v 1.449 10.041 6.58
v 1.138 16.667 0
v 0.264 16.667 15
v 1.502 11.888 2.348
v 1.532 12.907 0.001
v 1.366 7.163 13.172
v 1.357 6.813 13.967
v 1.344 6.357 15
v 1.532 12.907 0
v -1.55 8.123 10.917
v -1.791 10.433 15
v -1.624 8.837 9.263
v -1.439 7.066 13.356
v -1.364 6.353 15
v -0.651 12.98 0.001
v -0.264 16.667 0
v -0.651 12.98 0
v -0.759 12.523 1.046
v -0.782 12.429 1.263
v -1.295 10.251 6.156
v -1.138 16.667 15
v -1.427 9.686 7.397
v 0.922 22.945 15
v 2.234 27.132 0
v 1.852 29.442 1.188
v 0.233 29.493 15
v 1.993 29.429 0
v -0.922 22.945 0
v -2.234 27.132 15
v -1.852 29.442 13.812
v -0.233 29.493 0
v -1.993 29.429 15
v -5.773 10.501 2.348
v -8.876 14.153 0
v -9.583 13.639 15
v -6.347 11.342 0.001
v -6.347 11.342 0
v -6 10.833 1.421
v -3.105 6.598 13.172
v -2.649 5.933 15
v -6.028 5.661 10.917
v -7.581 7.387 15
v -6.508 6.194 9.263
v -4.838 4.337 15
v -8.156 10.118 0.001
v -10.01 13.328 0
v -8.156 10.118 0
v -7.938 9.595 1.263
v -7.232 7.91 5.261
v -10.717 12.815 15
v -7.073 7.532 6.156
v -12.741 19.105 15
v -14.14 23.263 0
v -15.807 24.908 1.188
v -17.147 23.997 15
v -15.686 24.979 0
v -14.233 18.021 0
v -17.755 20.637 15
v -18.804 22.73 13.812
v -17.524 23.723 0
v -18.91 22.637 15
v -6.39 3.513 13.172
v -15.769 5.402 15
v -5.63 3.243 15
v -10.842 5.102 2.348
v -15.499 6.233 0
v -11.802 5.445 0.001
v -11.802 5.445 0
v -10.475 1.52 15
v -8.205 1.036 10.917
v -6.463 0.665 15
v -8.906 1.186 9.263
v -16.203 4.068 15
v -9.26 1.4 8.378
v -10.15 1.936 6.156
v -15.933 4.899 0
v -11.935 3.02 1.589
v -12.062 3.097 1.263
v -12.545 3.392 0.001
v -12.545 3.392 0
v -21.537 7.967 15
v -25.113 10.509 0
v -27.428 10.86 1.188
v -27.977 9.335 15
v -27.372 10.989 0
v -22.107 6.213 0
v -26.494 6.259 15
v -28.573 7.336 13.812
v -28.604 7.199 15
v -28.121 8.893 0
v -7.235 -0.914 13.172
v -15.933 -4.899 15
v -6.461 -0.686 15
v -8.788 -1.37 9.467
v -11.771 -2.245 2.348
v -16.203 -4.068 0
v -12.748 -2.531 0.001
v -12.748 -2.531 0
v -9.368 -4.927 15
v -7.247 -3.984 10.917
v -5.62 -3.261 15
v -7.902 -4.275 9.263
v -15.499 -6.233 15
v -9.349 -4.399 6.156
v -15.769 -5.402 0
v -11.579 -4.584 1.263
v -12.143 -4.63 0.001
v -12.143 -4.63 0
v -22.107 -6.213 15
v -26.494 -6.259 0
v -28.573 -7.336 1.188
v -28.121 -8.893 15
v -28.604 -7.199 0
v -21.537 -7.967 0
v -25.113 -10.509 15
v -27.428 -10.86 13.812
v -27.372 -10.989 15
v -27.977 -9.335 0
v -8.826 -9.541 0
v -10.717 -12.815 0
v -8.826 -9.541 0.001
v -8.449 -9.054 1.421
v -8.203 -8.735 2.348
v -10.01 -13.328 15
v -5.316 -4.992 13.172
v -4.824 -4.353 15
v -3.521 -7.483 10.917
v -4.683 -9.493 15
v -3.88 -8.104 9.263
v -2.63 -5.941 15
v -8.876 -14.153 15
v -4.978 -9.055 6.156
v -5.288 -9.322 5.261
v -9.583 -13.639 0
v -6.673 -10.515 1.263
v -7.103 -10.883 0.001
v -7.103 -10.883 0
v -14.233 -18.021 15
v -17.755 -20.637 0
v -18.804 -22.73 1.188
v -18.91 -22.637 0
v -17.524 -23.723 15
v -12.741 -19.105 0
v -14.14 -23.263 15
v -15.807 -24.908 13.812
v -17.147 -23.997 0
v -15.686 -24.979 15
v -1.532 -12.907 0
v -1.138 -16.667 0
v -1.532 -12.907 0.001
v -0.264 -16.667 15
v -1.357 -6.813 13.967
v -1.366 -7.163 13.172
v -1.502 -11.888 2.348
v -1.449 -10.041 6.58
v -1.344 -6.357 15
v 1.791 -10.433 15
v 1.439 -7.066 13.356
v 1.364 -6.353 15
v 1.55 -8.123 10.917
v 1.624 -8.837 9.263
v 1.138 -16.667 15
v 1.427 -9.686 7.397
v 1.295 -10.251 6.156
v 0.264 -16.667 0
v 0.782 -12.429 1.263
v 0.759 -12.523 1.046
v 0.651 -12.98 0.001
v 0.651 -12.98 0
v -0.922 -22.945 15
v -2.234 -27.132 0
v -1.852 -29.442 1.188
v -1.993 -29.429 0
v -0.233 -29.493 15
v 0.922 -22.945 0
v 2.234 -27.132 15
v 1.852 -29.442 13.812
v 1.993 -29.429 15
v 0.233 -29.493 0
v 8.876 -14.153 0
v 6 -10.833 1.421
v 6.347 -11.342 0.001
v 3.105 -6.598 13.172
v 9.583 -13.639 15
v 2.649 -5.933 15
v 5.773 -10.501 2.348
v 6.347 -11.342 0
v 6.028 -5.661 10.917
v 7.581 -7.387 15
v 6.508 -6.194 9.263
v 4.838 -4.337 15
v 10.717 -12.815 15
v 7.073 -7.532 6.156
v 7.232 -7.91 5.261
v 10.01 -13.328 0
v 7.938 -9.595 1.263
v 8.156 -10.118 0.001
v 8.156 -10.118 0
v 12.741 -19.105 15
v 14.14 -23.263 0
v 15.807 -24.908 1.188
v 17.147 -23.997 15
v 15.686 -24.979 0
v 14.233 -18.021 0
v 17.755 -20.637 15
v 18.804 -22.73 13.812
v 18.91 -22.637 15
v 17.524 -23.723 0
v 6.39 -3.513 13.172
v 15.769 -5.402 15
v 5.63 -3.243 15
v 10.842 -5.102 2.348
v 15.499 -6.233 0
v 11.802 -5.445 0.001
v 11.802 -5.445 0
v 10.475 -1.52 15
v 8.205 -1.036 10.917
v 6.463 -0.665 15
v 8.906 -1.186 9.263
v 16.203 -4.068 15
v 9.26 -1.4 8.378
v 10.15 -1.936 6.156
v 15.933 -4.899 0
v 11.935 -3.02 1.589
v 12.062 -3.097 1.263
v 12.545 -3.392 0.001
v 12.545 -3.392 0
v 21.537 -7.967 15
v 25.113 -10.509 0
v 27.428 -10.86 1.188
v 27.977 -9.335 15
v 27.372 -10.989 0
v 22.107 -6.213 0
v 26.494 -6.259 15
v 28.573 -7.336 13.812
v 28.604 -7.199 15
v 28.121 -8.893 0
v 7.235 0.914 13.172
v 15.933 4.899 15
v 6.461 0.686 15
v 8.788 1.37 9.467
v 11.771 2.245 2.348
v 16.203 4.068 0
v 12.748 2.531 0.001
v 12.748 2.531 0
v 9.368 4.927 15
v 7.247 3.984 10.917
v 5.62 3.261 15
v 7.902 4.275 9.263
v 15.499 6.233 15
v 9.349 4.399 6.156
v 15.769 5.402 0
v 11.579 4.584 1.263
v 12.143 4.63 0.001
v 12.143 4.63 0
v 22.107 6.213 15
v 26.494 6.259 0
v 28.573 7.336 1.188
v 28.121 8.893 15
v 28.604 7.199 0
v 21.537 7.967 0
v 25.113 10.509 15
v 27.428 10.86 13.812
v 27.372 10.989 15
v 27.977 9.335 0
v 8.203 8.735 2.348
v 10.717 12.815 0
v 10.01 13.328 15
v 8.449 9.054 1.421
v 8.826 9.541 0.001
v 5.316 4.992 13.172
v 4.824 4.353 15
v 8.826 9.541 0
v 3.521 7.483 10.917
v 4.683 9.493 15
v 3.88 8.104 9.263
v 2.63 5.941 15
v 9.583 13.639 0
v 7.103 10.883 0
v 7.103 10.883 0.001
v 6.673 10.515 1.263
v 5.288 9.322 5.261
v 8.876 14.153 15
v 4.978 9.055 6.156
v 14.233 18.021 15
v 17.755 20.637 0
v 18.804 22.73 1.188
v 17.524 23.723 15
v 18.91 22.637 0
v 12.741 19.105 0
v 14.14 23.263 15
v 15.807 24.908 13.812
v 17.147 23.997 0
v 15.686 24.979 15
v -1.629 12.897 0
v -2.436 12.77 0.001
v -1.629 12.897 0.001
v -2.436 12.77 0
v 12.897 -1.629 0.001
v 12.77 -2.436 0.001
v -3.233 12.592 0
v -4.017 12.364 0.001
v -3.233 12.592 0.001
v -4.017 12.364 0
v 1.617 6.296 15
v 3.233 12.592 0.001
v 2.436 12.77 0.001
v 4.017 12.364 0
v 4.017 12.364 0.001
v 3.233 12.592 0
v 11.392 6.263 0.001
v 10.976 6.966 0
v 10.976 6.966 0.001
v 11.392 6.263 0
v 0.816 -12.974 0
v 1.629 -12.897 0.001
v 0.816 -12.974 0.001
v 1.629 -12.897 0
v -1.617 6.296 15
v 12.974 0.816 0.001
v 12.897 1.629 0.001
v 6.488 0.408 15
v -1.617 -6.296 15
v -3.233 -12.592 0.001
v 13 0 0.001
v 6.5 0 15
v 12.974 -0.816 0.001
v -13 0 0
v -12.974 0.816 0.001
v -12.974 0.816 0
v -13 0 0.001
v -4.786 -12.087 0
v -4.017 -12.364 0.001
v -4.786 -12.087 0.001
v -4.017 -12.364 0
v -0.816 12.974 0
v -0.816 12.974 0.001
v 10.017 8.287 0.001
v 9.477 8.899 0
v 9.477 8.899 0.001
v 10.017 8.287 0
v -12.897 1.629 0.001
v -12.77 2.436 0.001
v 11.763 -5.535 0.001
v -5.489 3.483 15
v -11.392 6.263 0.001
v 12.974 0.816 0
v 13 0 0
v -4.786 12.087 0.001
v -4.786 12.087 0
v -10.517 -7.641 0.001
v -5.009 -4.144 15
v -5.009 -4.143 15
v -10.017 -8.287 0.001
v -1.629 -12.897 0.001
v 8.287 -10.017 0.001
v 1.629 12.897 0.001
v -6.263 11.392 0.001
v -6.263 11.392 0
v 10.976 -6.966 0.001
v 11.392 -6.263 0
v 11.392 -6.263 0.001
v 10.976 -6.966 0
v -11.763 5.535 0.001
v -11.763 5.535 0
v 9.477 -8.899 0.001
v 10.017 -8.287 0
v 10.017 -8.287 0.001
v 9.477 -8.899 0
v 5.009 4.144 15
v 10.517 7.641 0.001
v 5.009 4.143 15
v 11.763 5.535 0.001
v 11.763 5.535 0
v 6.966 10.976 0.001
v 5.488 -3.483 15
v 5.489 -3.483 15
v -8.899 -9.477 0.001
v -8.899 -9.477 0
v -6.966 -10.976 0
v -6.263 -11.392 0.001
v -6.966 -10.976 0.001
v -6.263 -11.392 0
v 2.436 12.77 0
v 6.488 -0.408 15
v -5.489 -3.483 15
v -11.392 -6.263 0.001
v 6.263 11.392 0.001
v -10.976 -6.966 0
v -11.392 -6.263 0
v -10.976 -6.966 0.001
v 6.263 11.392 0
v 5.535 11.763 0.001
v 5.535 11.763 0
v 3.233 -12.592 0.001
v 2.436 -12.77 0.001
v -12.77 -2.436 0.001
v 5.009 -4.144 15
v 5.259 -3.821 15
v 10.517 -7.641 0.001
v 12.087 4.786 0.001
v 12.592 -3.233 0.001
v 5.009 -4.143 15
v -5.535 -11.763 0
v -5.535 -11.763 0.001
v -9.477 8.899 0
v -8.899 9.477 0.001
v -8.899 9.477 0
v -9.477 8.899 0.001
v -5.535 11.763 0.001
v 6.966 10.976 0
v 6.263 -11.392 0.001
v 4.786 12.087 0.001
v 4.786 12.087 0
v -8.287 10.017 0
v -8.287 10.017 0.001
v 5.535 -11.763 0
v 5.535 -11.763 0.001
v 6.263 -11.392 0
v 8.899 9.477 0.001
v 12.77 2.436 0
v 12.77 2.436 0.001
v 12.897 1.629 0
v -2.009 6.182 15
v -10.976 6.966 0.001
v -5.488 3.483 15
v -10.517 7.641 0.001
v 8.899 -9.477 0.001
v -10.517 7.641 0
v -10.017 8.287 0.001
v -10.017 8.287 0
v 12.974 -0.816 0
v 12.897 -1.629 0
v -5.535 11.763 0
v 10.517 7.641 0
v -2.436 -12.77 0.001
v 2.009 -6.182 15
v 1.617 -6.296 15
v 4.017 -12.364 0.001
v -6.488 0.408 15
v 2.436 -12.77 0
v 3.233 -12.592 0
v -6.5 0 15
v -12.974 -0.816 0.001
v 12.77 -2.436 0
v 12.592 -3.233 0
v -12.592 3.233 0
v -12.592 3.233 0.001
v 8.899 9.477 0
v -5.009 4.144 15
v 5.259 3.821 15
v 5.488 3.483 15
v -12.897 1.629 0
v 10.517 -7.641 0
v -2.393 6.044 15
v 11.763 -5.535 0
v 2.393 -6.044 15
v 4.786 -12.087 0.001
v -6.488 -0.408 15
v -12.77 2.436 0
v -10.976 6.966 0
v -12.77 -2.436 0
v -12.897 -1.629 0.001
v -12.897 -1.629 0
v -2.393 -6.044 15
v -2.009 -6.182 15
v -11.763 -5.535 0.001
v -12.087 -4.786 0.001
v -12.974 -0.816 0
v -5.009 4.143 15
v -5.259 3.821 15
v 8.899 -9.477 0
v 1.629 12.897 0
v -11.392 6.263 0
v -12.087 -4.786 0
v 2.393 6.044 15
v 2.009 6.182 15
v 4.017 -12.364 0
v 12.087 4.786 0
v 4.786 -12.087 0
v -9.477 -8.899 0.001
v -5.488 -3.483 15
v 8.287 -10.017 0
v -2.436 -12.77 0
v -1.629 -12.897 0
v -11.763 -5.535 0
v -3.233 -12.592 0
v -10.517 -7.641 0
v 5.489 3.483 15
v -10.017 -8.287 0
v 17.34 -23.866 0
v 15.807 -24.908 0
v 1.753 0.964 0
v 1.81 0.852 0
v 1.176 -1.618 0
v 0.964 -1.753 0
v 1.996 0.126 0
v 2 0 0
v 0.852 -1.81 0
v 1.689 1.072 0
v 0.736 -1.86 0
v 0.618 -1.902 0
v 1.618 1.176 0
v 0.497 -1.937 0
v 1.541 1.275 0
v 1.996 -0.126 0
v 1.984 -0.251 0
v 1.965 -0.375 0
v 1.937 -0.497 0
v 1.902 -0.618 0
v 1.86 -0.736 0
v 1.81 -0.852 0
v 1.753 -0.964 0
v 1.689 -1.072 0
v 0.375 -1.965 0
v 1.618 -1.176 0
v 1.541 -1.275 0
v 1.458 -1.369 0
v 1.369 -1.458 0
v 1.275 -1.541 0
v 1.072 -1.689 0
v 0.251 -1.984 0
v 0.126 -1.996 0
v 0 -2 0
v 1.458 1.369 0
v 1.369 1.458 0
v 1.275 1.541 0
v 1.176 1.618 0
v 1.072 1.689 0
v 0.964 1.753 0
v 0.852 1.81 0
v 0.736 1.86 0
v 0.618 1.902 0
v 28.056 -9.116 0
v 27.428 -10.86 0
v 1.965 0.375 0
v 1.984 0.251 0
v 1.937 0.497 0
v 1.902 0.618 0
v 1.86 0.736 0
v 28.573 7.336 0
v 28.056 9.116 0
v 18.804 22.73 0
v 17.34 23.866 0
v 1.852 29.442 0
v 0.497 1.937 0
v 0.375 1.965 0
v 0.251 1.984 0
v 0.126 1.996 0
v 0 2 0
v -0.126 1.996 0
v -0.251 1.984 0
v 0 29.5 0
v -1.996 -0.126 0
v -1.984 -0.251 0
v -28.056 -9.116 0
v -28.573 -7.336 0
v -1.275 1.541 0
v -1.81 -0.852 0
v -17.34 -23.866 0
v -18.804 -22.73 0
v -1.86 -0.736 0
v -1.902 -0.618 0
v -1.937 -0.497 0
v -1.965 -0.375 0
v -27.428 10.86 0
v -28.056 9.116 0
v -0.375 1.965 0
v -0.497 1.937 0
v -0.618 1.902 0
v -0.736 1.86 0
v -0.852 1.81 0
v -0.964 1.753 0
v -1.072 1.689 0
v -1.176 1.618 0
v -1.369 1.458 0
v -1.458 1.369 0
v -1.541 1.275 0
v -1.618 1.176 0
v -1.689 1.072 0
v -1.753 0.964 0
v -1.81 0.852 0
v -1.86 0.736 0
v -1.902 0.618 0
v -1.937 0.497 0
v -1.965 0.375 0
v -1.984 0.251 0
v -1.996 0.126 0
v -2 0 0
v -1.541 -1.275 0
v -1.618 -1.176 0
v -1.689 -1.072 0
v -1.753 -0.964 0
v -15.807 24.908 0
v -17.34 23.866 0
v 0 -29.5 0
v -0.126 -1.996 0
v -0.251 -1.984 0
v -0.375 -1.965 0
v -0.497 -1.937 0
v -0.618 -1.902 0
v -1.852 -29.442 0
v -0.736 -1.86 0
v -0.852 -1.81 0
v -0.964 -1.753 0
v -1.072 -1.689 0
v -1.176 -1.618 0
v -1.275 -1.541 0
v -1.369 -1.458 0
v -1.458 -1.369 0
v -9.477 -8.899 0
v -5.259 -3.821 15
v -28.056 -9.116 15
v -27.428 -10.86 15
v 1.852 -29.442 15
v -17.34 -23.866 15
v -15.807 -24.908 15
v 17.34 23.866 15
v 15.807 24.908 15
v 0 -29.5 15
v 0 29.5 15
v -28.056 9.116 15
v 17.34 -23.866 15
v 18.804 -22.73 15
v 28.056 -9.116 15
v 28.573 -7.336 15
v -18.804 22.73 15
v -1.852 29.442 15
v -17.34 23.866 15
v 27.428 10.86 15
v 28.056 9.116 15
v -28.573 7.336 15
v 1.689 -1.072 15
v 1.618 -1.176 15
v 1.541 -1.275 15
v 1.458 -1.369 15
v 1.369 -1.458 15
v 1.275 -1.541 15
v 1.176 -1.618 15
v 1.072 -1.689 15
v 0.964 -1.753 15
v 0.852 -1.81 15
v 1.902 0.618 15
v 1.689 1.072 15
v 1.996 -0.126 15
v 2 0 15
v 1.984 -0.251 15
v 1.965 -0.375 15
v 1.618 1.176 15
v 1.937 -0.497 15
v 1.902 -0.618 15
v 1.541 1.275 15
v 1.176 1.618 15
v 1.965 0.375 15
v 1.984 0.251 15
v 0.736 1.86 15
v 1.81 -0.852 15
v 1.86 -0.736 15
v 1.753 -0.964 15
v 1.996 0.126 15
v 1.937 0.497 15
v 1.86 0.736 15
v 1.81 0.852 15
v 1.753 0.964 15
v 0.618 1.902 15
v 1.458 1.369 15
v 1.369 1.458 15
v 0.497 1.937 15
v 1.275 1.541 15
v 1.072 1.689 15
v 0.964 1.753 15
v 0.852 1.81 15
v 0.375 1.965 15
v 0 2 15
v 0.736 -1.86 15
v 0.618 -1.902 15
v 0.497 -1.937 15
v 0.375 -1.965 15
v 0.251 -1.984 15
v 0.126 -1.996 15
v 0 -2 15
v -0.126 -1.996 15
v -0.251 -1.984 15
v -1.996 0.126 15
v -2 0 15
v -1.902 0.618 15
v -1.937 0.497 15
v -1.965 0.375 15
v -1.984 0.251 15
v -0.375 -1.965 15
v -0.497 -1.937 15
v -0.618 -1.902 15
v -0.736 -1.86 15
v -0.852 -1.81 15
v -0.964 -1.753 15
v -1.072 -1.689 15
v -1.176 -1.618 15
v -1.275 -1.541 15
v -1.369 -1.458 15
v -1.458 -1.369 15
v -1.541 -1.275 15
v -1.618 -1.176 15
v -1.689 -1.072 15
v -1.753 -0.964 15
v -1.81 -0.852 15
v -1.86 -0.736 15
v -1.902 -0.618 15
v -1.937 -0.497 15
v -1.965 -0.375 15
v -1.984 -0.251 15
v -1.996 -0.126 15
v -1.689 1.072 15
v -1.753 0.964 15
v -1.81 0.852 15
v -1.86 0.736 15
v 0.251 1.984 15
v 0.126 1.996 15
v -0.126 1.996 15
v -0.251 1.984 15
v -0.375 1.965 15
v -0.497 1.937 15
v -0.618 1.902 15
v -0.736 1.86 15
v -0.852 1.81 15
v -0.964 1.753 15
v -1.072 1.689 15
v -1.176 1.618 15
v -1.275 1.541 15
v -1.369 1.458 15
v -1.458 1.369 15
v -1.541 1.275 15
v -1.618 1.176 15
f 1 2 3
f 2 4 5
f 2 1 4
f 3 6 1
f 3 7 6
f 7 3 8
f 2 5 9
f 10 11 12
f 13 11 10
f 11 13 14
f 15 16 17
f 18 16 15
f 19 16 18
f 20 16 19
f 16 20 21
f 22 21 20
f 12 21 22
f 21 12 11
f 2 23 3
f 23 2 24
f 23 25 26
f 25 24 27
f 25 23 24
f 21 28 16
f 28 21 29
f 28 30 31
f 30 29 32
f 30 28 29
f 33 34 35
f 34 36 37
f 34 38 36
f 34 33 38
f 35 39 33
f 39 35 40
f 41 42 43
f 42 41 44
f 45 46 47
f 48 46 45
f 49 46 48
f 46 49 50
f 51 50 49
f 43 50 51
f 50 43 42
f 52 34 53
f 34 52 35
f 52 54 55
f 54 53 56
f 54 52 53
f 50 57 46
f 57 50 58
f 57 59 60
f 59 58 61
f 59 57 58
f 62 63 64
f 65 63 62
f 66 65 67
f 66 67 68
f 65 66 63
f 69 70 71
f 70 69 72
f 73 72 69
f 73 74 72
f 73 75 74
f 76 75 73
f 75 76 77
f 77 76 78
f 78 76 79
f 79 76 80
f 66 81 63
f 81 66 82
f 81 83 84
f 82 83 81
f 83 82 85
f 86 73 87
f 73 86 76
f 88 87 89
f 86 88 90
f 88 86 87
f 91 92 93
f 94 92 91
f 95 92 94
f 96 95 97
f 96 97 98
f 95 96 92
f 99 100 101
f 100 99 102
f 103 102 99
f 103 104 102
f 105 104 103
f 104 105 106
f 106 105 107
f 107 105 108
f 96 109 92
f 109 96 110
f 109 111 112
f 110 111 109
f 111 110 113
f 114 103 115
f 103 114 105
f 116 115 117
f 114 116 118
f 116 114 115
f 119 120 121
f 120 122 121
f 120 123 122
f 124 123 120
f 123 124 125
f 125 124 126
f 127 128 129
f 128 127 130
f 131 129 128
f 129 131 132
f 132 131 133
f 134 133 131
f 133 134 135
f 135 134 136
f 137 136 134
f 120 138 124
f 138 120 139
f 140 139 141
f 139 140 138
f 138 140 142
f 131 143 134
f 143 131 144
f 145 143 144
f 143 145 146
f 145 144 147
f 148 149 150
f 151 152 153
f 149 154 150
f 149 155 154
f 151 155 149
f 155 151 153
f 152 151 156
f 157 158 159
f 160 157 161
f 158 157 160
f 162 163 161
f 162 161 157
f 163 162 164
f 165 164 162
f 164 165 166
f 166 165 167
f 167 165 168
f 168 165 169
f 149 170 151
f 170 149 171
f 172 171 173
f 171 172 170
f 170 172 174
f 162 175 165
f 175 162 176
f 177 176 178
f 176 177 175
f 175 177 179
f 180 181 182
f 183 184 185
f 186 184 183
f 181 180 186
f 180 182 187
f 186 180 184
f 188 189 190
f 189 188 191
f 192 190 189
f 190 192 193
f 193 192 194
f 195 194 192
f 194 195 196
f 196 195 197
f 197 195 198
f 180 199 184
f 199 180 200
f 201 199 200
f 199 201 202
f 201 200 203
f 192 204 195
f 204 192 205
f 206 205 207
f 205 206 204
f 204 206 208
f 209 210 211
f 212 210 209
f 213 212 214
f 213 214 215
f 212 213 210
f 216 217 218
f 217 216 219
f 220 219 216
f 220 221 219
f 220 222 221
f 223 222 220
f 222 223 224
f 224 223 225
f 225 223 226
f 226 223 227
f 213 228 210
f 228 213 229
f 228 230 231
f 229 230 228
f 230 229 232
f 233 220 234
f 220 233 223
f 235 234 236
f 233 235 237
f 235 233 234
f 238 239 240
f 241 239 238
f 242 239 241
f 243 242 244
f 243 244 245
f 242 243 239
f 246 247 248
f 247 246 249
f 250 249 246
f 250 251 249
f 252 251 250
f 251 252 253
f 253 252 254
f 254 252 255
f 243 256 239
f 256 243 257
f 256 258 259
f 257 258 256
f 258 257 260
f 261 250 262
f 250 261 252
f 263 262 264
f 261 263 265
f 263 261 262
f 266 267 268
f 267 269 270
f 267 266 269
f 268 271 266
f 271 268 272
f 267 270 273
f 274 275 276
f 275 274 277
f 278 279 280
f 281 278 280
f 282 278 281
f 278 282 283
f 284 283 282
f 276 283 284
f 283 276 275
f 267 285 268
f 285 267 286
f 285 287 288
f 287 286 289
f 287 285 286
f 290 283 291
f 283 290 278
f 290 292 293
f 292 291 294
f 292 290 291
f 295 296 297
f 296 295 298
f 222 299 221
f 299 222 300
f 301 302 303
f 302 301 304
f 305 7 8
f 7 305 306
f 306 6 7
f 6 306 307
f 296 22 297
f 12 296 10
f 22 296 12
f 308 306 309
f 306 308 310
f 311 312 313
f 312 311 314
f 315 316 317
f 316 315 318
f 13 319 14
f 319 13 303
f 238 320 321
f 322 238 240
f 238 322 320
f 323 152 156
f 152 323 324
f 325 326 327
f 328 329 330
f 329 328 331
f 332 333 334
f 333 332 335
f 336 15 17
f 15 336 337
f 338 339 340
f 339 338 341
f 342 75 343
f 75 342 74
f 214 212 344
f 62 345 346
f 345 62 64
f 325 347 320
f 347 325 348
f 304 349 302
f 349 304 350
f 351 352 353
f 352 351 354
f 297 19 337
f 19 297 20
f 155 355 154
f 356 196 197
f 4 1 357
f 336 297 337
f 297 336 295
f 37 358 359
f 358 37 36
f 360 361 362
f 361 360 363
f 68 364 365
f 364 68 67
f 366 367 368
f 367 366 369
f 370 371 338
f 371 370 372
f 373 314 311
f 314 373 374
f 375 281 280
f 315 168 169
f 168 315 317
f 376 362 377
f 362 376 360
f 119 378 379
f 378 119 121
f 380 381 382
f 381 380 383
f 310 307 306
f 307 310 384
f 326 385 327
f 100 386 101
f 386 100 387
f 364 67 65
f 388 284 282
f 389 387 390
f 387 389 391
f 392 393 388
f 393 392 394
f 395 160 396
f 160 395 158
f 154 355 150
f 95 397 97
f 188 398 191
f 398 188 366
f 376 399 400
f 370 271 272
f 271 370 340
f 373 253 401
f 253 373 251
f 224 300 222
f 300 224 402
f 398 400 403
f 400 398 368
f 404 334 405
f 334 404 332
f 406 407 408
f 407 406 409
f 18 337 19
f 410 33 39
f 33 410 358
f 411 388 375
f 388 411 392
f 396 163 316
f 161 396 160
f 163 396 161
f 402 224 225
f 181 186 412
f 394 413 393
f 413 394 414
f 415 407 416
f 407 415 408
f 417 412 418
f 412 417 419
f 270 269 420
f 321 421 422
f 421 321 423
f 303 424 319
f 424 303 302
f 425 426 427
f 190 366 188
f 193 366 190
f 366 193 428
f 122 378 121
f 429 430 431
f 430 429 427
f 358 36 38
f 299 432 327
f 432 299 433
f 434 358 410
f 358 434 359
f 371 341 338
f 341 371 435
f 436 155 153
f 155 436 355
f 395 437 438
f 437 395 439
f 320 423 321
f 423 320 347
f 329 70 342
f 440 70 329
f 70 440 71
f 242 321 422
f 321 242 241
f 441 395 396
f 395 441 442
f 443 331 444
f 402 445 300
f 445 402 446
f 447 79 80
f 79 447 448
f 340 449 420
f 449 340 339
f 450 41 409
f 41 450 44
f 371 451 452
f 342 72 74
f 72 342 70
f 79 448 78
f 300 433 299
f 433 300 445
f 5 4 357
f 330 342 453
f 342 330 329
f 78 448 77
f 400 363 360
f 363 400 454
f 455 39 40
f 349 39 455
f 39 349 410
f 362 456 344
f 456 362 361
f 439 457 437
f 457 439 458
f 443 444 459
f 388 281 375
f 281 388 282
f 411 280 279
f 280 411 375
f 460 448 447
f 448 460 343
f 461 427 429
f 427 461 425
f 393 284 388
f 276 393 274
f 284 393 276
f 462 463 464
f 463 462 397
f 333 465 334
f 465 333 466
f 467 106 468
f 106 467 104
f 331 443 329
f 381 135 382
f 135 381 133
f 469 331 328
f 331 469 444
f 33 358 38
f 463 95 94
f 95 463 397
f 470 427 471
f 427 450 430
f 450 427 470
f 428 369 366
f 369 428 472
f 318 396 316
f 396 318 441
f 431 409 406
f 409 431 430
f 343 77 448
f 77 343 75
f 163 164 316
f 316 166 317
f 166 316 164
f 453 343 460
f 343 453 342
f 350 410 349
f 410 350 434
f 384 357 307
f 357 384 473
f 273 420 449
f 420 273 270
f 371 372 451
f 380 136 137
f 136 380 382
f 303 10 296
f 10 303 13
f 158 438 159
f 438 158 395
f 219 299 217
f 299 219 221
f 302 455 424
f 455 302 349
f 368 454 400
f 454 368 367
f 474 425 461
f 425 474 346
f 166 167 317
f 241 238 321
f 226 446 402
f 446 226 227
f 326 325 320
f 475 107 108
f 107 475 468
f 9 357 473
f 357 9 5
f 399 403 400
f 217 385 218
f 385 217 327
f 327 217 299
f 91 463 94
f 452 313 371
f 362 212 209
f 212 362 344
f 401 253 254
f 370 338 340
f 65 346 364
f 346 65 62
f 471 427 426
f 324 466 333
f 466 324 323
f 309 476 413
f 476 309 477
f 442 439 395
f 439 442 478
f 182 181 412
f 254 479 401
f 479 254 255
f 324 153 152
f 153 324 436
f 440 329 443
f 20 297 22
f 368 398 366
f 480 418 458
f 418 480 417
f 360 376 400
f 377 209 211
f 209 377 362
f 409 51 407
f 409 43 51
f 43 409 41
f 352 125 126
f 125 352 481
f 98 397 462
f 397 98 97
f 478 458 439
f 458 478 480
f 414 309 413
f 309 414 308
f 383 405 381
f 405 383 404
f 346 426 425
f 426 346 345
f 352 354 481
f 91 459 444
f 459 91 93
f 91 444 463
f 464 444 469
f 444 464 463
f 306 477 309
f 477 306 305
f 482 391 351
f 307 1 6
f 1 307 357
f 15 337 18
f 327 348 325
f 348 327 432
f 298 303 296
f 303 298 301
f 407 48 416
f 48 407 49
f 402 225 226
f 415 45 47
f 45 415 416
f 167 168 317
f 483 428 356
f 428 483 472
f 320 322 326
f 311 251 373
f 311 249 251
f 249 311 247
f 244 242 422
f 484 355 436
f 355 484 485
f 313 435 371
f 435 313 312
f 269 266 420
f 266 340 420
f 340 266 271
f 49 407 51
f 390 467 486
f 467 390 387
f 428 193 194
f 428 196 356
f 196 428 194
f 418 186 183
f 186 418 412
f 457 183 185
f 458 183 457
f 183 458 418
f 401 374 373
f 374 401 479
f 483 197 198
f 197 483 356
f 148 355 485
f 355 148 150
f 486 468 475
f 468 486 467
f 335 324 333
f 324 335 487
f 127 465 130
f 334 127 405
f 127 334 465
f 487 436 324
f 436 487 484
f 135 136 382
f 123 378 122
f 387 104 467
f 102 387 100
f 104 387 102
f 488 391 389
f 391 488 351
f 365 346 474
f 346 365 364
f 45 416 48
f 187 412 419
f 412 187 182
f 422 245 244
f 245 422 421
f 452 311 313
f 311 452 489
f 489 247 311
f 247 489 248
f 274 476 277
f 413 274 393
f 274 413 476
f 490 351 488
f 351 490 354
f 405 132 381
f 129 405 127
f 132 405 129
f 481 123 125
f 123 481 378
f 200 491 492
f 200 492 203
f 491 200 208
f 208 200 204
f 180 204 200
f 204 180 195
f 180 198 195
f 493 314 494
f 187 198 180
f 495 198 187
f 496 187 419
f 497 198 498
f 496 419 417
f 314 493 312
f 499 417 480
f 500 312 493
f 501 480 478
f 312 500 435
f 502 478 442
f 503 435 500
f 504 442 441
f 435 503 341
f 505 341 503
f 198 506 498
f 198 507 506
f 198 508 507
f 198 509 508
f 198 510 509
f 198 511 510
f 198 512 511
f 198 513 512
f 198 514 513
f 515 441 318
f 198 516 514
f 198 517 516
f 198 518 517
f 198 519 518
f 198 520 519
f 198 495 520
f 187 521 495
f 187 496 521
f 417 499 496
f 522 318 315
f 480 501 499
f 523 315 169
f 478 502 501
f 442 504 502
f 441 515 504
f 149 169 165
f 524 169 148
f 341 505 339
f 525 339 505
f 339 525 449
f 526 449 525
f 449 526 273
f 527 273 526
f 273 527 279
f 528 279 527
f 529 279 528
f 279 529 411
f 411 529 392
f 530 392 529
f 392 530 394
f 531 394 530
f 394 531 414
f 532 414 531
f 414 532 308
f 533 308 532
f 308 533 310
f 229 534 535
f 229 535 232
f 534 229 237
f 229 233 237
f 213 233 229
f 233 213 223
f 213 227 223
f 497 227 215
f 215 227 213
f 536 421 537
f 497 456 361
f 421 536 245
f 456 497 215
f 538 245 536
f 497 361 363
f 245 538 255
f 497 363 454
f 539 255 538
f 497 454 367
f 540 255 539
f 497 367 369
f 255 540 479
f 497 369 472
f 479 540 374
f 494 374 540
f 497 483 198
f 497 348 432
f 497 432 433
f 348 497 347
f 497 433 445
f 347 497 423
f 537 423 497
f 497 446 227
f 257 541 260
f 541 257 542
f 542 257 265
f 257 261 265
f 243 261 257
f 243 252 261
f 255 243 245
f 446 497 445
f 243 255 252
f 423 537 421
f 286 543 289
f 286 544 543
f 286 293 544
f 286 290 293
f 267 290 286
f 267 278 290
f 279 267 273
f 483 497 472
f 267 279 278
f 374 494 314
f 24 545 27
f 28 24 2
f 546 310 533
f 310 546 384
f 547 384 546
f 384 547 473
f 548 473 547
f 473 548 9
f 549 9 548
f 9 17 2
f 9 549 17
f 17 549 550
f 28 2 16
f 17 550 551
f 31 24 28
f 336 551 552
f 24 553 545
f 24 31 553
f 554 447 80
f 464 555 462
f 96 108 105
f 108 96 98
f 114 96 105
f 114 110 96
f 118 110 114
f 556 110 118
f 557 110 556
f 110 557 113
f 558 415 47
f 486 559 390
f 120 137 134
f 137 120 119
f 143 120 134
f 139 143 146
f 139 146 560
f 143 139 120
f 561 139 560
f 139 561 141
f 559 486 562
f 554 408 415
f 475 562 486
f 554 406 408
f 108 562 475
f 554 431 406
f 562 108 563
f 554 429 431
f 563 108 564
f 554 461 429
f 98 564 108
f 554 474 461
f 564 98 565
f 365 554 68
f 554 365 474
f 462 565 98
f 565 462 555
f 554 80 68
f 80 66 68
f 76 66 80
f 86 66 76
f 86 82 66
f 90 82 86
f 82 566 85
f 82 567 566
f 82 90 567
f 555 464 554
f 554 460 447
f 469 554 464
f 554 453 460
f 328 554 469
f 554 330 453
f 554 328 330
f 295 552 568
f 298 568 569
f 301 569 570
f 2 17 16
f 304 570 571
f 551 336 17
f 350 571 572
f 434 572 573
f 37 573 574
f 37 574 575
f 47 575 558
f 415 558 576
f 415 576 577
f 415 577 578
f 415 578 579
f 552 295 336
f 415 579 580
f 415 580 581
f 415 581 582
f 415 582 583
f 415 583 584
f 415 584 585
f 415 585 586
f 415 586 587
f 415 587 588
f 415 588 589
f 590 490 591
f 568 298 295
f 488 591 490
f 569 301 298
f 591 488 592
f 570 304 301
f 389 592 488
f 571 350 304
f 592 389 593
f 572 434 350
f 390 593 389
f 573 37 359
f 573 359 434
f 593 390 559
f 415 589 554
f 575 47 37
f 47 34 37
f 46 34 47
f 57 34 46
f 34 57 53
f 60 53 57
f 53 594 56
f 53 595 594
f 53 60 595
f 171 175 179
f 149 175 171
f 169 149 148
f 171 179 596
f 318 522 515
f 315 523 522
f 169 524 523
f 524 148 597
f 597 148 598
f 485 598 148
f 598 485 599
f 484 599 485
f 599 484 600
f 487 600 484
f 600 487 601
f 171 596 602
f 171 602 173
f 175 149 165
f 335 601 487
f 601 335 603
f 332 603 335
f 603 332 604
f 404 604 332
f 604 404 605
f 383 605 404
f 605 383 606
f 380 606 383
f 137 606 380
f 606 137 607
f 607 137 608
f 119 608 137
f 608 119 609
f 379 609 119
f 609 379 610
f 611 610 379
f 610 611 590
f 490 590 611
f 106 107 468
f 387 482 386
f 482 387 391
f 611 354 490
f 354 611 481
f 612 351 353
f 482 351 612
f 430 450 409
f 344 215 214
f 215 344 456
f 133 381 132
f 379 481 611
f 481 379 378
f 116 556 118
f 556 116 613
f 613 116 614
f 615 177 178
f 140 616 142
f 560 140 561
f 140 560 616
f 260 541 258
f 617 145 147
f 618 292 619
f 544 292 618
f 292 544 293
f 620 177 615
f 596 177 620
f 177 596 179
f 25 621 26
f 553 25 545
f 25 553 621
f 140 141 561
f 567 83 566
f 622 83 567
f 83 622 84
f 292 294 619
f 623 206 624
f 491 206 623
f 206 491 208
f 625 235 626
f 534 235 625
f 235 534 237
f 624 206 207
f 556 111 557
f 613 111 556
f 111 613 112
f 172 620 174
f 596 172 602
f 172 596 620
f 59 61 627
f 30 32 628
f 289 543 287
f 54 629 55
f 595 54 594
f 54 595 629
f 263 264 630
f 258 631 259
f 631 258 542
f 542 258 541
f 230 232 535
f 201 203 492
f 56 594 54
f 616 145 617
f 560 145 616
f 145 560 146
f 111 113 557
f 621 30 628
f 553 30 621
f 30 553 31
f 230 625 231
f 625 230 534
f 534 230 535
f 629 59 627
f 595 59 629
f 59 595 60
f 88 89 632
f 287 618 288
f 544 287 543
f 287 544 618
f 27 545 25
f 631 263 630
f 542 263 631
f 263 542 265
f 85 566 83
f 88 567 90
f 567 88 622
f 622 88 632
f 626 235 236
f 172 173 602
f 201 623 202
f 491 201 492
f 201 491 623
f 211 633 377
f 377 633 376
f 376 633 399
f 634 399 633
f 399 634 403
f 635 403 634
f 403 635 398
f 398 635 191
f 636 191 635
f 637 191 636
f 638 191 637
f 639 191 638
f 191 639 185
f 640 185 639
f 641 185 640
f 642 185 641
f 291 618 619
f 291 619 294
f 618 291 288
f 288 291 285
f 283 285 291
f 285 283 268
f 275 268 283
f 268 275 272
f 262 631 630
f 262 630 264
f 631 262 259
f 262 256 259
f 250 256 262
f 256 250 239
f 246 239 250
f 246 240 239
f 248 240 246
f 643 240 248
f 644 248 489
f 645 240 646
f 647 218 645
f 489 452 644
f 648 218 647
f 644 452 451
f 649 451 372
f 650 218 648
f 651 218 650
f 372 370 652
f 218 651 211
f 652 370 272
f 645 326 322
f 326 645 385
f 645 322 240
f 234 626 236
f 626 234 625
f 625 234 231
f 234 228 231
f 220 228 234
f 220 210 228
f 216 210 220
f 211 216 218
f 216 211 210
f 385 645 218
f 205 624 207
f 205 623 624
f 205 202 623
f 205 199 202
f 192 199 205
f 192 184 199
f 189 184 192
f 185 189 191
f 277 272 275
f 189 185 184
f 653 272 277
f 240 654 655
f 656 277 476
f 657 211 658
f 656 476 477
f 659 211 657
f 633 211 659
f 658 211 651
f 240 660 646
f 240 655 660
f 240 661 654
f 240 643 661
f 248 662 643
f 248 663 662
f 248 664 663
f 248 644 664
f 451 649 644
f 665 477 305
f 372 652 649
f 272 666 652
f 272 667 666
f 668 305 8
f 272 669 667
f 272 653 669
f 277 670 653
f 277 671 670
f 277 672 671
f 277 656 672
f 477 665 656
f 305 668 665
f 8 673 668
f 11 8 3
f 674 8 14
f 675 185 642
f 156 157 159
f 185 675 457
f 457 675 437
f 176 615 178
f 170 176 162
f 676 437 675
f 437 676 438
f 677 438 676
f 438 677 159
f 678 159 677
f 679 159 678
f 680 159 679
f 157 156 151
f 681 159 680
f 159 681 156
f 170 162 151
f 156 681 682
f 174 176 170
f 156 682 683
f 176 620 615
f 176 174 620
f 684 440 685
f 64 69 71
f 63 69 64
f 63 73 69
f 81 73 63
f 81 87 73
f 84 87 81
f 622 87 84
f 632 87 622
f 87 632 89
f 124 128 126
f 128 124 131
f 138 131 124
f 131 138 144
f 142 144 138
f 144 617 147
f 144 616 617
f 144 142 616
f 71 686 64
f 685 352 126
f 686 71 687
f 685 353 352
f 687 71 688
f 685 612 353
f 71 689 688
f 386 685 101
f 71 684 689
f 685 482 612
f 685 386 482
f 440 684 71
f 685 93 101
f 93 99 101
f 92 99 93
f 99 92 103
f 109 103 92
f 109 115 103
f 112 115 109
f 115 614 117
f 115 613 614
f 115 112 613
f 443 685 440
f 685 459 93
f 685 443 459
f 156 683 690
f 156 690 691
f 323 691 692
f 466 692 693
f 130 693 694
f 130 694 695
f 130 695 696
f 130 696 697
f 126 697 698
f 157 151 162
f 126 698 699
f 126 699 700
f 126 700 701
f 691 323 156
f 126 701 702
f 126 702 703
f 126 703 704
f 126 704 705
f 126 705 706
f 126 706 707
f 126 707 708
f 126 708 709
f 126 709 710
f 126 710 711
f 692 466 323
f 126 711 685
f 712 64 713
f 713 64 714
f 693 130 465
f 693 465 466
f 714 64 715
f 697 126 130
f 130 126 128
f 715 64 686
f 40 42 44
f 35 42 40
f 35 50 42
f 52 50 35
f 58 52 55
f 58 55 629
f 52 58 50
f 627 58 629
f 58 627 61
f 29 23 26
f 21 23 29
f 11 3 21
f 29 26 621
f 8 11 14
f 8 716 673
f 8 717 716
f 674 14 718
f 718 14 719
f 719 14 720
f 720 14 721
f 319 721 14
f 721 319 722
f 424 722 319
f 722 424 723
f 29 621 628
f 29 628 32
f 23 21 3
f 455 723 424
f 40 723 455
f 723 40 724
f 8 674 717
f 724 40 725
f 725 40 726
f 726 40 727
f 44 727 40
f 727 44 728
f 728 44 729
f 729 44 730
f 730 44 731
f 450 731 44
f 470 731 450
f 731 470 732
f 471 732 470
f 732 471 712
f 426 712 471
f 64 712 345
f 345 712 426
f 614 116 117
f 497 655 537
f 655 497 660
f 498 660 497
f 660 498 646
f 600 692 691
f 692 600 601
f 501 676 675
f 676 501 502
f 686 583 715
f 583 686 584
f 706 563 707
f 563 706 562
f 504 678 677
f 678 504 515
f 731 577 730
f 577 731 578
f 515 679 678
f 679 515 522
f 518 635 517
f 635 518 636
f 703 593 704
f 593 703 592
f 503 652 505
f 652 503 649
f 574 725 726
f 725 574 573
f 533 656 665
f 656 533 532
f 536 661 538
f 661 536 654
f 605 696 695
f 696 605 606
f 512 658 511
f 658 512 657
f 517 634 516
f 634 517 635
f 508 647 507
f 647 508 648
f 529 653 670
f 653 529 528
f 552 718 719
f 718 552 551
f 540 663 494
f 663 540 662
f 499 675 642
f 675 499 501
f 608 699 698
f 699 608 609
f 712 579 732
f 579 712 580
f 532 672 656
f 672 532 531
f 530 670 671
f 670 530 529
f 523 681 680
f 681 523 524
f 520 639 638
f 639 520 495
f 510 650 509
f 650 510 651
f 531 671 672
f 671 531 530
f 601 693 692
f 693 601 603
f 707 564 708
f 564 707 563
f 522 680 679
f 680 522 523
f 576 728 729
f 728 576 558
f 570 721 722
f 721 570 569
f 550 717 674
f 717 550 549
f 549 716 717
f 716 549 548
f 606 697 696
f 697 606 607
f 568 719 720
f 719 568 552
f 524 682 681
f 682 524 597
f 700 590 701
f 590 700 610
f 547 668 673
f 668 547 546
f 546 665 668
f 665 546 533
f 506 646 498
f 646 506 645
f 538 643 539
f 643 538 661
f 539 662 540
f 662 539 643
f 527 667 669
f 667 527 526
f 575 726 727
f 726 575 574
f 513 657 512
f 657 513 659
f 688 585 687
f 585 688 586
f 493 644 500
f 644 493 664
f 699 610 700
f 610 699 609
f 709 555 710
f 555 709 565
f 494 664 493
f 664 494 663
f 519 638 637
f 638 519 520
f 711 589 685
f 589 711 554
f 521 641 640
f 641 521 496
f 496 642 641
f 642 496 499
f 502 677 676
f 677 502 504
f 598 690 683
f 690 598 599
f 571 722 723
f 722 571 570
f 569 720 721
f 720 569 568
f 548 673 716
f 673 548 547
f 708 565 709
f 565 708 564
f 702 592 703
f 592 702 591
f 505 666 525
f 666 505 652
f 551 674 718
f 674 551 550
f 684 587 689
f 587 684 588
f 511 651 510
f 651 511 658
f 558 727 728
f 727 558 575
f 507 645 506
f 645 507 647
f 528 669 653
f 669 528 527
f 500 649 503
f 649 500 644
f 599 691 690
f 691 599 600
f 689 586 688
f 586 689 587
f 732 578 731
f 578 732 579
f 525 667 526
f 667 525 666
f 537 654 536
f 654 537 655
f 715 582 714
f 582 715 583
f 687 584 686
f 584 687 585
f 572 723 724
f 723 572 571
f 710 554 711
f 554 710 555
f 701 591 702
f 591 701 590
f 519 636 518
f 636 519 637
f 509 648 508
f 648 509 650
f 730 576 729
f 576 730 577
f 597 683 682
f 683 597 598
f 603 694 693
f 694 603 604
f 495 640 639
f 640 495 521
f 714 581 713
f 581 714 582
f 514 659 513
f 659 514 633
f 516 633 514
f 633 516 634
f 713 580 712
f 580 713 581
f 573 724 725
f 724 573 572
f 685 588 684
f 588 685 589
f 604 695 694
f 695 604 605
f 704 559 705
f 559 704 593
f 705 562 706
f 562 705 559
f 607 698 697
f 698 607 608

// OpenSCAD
// Lets make an axial compressor!
// Single stackable compressor stage

// Render setting ========
render_housing=0;
render_compressor=1;


// Params  ===========
// ================
$fn=100;

// Housing
housing_id=60;
housing_od=65;
housing_h=32;
num_flanges=3;

// All fans
fan_blade_tolerance=0.5; // Between blade and housing
fan_fan_tolerance=1; // between stages, stator and compressor. aka size of washer
fan_blade_thickness=1.4;
fan_hub_thickness=(housing_h-fan_fan_tolerance*2)/2;

// stator fan
// Comment out unused stages
stator_num_blades=8;
stator_blade_angle=20;

//Stage 3
stator_hub_d_start=53.5;
stator_hub_d_end=55;

//Stage 2
stator_hub_d_start=44;
stator_hub_d_end=50;

//Stage 1
stator_hub_d_start=26;
stator_hub_d_end=36;


// compressor fan 
// Comment out unused stages
compressor_num_blades=10;
compressor_blade_angle=25;
compressor_blade_radius=40;
compressor_blade_center_offset=7;


//Stage 3
compressor_hub_d_start=50;
compressor_hub_d_end=53.5;

//Stage 2
compressor_hub_d_start=36;
compressor_hub_d_end=44;

//Stage 1
compressor_hub_d_start=13;
compressor_hub_d_end=26;

// Misc
m3=3;
shaft_od=4;
bearing_od=12;
bearing_thickness=4;
washer_od=10;
washer_thickness=1.6;
//================




// stator Housing Def =============
// ================
if(render_housing){
// Housing
difference(){
    cylinder(d=housing_od, h=housing_h);
    cylinder(d=housing_id, h=housing_h);
}

// Stator blades
difference(){
    intersection(){
        union(){
            hull(){
                cylinder(d=stator_hub_d_end,h=0.001);
                translate([0,0,fan_hub_thickness]) cylinder(d=stator_hub_d_start,h=0.001);
            }
    
            for(i=[0:stator_num_blades-1]){
                rotate([0,0,i*(360/stator_num_blades)]) {
                    translate([shaft_od*-1,housing_od/2,fan_hub_thickness/2]) {
                        rotate([0,stator_blade_angle,0]) {
                            cube([fan_blade_thickness,housing_od, fan_hub_thickness*2],true);
                        }
                    }
                }
            }
        }
        cylinder(d=housing_id,h=fan_hub_thickness);
    
    }
    cylinder(d=shaft_od+1,h=fan_hub_thickness);
    cylinder(d=bearing_od,h=bearing_thickness);
    translate([0,0,fan_hub_thickness-bearing_thickness]) cylinder(d=bearing_od,h=bearing_thickness);

}
}

if(render_compressor){
difference(){
    intersection(){
        union(){
            hull(){
                cylinder(d=compressor_hub_d_end, h=0.001);
                translate([0,0,fan_hub_thickness]) cylinder(d=compressor_hub_d_start,h=0.001);
            }
    
            for(i=[0:compressor_num_blades-1]){
                rotate([-90,0,i*(360/compressor_num_blades)]) {
                    translate([0,fan_hub_thickness/-2,0]) {
                        linear_extrude(height=50, twist=10) 
                            translate([fan_blade_thickness/-2,fan_hub_thickness*4/-2]) square([fan_blade_thickness,fan_hub_thickness*4]);
                            
                    }
                }
            }
        }
        cylinder(d=housing_id-fan_blade_tolerance*2,h=fan_hub_thickness);
    
    }
    cylinder(d=shaft_od,h=fan_hub_thickness);

}
}
